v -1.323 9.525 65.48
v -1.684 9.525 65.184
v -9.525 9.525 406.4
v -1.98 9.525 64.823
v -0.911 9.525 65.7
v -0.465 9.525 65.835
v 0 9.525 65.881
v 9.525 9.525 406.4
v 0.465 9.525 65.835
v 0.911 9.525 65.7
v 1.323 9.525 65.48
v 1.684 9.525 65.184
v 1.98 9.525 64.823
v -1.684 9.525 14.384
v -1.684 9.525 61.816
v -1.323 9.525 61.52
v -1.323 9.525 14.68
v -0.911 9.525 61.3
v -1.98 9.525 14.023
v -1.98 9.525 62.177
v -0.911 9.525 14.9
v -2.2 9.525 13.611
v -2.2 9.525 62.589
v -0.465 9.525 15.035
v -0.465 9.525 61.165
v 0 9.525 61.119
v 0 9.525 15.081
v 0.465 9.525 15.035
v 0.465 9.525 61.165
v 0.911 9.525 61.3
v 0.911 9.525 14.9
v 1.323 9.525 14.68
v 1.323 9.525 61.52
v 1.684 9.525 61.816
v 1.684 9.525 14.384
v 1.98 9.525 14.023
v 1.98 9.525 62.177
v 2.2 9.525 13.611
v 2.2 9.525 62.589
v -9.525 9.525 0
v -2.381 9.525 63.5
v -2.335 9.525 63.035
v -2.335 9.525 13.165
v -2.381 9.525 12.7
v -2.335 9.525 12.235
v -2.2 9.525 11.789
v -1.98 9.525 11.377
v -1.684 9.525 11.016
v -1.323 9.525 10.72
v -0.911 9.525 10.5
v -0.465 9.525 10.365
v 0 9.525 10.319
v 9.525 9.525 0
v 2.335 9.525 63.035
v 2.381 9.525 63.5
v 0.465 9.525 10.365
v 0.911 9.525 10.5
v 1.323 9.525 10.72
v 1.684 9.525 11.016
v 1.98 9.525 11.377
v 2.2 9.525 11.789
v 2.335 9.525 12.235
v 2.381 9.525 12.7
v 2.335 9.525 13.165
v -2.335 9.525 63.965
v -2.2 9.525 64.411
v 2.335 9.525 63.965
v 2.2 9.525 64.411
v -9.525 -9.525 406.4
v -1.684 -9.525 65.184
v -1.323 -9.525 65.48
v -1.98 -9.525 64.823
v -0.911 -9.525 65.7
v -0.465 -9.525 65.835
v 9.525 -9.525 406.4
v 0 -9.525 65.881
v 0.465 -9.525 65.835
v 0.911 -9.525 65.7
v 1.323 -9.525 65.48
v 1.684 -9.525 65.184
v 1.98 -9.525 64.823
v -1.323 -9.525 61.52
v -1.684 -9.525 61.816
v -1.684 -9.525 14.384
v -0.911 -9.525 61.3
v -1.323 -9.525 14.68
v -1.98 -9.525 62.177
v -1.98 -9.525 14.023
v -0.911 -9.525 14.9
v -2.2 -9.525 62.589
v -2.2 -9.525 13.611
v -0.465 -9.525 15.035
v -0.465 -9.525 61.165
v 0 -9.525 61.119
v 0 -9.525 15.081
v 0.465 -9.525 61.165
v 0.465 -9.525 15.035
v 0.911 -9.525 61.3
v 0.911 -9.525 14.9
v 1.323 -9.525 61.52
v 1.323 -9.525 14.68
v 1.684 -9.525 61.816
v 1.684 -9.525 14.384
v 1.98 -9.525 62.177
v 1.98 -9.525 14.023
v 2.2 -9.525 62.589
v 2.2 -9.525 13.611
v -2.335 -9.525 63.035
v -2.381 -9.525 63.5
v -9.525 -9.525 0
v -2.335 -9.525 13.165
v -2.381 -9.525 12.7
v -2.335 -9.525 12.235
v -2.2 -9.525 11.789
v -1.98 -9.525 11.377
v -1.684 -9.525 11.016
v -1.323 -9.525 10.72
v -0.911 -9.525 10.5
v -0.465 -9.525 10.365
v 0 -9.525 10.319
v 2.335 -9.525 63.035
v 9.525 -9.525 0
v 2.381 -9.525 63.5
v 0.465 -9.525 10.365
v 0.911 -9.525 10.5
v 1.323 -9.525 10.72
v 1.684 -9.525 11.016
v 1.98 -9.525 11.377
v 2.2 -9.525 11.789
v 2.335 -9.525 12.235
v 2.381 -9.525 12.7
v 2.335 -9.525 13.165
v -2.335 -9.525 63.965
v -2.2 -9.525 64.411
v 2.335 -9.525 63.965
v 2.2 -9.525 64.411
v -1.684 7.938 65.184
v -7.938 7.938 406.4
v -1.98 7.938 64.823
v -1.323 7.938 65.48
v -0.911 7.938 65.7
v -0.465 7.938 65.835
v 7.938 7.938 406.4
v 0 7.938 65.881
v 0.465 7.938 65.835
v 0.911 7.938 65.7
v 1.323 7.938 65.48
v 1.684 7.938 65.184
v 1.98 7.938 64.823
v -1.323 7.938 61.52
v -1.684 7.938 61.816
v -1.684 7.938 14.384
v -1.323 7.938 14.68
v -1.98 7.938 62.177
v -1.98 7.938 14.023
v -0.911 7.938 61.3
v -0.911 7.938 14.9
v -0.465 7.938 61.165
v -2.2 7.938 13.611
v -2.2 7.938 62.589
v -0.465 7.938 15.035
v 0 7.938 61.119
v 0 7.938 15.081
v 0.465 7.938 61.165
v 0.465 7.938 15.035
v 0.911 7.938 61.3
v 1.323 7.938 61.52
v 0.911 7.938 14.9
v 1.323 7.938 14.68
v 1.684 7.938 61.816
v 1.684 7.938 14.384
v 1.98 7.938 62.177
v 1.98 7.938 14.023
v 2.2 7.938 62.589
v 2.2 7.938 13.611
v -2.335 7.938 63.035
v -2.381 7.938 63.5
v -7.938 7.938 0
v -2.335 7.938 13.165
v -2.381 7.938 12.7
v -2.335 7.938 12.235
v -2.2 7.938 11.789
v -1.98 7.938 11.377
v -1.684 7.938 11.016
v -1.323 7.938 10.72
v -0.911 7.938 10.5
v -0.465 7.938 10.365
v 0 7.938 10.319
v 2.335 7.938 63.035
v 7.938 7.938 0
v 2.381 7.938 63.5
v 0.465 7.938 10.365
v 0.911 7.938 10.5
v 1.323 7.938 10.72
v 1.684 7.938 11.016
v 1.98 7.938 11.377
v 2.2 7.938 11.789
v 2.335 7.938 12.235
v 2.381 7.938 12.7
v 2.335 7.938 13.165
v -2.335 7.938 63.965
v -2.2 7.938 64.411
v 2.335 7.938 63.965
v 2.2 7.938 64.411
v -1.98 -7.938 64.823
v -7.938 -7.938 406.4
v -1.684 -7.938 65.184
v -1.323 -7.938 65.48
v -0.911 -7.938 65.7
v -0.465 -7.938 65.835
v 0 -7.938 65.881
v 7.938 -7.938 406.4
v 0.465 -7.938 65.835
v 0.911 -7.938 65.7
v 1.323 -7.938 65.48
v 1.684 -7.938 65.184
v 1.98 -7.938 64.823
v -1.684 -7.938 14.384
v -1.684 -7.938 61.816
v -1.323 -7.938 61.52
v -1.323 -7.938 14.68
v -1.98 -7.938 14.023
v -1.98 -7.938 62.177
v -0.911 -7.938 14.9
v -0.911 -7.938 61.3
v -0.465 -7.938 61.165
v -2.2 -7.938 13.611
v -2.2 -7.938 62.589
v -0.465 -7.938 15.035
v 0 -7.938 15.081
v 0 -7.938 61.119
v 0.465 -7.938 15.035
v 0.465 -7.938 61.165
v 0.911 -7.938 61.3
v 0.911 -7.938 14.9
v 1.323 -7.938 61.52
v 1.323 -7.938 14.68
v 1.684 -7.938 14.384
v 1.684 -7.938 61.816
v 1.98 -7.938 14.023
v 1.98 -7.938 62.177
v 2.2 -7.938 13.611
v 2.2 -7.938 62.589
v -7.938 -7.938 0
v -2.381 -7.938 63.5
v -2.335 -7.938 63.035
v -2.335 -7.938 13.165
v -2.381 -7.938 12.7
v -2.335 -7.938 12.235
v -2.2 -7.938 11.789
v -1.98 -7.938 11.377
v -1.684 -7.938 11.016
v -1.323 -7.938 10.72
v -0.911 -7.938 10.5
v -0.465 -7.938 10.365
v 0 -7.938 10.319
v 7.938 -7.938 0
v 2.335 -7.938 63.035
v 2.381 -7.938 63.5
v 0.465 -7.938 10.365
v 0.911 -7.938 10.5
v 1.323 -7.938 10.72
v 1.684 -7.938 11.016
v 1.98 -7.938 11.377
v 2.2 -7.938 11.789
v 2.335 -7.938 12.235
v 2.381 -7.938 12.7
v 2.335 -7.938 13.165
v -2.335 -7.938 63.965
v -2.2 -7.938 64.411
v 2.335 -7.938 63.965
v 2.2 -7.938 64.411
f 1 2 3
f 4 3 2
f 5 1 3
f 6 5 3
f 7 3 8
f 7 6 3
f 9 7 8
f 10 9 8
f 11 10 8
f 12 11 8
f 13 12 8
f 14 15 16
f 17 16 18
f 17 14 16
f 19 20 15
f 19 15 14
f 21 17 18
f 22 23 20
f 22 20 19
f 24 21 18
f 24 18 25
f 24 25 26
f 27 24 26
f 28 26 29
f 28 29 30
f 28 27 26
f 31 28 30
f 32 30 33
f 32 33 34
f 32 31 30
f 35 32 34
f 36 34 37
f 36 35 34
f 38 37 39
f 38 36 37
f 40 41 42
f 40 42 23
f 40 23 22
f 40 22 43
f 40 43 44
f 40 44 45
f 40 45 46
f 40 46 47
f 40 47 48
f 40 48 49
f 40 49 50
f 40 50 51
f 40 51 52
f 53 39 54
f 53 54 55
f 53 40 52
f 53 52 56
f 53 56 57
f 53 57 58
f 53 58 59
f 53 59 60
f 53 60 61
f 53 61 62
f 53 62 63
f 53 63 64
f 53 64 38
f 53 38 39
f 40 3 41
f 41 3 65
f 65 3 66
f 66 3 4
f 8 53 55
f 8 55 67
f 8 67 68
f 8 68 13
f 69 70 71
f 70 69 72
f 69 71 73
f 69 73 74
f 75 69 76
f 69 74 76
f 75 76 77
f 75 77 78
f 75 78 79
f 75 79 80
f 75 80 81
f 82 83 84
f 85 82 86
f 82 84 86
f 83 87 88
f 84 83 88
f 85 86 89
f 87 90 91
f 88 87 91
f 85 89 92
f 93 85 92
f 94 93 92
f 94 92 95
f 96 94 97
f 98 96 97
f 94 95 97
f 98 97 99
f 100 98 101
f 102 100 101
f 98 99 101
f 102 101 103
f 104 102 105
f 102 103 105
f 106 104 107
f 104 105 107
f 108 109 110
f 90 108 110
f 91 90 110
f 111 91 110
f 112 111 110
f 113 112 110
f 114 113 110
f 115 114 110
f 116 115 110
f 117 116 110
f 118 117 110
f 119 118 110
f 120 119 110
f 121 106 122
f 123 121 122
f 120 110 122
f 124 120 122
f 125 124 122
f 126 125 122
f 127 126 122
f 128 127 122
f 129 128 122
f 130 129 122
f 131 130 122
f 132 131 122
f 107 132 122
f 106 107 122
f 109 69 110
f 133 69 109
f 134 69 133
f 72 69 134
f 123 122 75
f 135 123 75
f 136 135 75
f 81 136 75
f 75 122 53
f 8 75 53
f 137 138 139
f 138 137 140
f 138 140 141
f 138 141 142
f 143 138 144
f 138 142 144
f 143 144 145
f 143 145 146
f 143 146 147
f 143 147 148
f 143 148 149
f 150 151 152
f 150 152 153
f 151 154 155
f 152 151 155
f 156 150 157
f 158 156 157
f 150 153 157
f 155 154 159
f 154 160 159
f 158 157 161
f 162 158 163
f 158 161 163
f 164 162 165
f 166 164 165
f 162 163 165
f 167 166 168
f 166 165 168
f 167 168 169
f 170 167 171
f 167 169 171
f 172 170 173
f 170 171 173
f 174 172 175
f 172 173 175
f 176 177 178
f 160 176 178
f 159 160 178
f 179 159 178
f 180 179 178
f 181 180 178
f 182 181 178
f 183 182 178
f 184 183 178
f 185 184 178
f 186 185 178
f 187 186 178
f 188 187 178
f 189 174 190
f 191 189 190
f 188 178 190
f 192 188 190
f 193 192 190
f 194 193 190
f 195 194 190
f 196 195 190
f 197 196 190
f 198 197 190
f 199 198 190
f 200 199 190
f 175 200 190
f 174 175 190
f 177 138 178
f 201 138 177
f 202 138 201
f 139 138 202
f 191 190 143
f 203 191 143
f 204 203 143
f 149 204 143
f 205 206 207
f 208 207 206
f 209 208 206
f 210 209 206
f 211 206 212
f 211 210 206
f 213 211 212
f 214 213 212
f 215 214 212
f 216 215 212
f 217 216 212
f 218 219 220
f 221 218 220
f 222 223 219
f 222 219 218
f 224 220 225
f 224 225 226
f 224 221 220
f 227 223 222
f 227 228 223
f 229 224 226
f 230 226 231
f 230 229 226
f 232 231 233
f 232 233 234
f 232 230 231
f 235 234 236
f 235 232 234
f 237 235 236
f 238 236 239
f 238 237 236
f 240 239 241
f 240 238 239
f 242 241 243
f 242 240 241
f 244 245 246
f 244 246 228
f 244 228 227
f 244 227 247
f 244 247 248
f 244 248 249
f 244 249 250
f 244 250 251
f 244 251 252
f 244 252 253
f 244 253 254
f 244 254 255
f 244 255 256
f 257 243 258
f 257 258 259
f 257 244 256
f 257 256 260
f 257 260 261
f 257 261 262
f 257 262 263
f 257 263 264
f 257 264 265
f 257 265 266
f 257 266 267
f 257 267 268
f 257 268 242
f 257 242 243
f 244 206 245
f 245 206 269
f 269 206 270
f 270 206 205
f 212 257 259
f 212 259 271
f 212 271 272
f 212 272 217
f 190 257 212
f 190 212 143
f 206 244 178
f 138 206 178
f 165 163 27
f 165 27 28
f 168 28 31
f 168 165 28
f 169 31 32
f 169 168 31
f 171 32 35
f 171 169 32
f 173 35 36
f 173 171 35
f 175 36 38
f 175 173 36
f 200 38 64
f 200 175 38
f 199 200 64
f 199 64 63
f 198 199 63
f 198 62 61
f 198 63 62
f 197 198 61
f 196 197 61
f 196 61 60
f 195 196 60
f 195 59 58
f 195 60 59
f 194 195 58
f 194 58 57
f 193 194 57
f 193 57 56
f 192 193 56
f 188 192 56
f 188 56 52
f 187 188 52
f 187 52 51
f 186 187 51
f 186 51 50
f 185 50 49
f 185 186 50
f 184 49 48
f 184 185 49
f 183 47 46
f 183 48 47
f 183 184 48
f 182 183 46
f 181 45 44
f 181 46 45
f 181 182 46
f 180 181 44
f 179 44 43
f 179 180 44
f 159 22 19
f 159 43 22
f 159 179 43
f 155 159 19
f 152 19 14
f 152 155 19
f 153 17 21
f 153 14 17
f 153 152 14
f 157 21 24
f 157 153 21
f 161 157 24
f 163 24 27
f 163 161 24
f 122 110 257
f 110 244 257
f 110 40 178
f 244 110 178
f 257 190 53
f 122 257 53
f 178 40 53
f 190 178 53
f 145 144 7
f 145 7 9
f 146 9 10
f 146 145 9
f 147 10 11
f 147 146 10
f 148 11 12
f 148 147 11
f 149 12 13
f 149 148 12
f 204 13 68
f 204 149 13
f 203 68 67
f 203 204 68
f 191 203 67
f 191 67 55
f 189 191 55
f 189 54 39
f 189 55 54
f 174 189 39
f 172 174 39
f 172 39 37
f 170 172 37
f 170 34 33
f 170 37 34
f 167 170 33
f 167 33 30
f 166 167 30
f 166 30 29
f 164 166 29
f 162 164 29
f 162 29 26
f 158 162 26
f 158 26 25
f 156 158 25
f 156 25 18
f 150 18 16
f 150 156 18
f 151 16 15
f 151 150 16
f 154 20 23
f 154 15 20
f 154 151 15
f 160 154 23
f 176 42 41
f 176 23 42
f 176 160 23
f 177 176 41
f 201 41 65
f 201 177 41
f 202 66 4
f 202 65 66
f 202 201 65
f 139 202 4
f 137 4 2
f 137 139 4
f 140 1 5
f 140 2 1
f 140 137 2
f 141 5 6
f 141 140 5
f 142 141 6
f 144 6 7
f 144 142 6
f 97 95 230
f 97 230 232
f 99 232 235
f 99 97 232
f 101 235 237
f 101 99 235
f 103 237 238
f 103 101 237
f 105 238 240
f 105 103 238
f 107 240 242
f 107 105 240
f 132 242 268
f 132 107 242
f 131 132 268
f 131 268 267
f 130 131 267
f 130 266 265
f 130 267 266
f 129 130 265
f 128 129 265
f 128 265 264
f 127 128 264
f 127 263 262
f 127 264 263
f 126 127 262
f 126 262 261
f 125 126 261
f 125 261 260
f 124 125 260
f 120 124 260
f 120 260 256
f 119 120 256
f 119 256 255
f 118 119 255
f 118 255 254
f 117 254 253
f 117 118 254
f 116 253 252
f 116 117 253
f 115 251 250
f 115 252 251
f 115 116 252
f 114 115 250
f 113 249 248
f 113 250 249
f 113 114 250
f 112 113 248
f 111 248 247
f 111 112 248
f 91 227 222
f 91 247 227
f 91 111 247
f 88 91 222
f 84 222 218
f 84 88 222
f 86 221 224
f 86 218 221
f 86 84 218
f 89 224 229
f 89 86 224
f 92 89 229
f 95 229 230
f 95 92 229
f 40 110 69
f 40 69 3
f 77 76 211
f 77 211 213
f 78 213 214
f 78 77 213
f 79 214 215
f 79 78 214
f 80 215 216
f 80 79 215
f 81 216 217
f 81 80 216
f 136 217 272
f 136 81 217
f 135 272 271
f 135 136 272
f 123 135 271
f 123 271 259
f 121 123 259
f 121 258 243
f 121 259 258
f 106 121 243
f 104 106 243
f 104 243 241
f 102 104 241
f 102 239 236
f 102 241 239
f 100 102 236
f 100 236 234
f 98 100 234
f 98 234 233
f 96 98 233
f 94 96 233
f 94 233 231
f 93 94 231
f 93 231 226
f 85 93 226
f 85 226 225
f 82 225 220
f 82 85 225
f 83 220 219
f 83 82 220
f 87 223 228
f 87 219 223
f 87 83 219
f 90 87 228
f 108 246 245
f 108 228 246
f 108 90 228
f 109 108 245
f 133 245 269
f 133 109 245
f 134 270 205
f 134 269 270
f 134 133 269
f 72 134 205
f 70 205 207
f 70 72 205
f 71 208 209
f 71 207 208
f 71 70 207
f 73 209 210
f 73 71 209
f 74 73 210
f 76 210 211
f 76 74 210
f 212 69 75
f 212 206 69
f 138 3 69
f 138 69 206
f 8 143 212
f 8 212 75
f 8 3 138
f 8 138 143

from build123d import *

# Parameters (mm, degrees)
SKETCH1_W               = 19.05
SKETCH1_H               = 19.05
SKETCH1_W_2             = 15.875
SKETCH1_H_2             = 15.875
BOSS_EXTRUDE1_DEPTH     = 406.4
CUT_EXTRUDE1_DEPTH      = 407.623180906
CUT_EXTRUDE1_DEPTH_BACK = 407.623180906
SKETCH2_R               = 2.38125


with BuildPart() as part:
    # Sketch1 → Boss-Extrude1 (new body)
    with BuildSketch(Plane.XY):
        Rectangle(SKETCH1_W, SKETCH1_H)
        Rectangle(SKETCH1_W_2, SKETCH1_H_2, mode=Mode.SUBTRACT)
    extrude(amount=BOSS_EXTRUDE1_DEPTH)

    # Sketch2 → Cut-Extrude1 (cut, two sides: drawn at the far end of the back side and taken through both)
    with BuildSketch(Plane(origin=(0, 0, 0), x_dir=(1, 0, 0), z_dir=(0, 1, 0)).offset(-CUT_EXTRUDE1_DEPTH_BACK)):
        with Locations(Location((0, -12.7, 0), (0, 0, 270))):
            Circle(SKETCH2_R)
        with Locations(Location((0, -63.5, 0), (0, 0, 270))):
            Circle(SKETCH2_R)
    extrude(amount=CUT_EXTRUDE1_DEPTH + CUT_EXTRUDE1_DEPTH_BACK, mode=Mode.SUBTRACT)


solid = part.part
